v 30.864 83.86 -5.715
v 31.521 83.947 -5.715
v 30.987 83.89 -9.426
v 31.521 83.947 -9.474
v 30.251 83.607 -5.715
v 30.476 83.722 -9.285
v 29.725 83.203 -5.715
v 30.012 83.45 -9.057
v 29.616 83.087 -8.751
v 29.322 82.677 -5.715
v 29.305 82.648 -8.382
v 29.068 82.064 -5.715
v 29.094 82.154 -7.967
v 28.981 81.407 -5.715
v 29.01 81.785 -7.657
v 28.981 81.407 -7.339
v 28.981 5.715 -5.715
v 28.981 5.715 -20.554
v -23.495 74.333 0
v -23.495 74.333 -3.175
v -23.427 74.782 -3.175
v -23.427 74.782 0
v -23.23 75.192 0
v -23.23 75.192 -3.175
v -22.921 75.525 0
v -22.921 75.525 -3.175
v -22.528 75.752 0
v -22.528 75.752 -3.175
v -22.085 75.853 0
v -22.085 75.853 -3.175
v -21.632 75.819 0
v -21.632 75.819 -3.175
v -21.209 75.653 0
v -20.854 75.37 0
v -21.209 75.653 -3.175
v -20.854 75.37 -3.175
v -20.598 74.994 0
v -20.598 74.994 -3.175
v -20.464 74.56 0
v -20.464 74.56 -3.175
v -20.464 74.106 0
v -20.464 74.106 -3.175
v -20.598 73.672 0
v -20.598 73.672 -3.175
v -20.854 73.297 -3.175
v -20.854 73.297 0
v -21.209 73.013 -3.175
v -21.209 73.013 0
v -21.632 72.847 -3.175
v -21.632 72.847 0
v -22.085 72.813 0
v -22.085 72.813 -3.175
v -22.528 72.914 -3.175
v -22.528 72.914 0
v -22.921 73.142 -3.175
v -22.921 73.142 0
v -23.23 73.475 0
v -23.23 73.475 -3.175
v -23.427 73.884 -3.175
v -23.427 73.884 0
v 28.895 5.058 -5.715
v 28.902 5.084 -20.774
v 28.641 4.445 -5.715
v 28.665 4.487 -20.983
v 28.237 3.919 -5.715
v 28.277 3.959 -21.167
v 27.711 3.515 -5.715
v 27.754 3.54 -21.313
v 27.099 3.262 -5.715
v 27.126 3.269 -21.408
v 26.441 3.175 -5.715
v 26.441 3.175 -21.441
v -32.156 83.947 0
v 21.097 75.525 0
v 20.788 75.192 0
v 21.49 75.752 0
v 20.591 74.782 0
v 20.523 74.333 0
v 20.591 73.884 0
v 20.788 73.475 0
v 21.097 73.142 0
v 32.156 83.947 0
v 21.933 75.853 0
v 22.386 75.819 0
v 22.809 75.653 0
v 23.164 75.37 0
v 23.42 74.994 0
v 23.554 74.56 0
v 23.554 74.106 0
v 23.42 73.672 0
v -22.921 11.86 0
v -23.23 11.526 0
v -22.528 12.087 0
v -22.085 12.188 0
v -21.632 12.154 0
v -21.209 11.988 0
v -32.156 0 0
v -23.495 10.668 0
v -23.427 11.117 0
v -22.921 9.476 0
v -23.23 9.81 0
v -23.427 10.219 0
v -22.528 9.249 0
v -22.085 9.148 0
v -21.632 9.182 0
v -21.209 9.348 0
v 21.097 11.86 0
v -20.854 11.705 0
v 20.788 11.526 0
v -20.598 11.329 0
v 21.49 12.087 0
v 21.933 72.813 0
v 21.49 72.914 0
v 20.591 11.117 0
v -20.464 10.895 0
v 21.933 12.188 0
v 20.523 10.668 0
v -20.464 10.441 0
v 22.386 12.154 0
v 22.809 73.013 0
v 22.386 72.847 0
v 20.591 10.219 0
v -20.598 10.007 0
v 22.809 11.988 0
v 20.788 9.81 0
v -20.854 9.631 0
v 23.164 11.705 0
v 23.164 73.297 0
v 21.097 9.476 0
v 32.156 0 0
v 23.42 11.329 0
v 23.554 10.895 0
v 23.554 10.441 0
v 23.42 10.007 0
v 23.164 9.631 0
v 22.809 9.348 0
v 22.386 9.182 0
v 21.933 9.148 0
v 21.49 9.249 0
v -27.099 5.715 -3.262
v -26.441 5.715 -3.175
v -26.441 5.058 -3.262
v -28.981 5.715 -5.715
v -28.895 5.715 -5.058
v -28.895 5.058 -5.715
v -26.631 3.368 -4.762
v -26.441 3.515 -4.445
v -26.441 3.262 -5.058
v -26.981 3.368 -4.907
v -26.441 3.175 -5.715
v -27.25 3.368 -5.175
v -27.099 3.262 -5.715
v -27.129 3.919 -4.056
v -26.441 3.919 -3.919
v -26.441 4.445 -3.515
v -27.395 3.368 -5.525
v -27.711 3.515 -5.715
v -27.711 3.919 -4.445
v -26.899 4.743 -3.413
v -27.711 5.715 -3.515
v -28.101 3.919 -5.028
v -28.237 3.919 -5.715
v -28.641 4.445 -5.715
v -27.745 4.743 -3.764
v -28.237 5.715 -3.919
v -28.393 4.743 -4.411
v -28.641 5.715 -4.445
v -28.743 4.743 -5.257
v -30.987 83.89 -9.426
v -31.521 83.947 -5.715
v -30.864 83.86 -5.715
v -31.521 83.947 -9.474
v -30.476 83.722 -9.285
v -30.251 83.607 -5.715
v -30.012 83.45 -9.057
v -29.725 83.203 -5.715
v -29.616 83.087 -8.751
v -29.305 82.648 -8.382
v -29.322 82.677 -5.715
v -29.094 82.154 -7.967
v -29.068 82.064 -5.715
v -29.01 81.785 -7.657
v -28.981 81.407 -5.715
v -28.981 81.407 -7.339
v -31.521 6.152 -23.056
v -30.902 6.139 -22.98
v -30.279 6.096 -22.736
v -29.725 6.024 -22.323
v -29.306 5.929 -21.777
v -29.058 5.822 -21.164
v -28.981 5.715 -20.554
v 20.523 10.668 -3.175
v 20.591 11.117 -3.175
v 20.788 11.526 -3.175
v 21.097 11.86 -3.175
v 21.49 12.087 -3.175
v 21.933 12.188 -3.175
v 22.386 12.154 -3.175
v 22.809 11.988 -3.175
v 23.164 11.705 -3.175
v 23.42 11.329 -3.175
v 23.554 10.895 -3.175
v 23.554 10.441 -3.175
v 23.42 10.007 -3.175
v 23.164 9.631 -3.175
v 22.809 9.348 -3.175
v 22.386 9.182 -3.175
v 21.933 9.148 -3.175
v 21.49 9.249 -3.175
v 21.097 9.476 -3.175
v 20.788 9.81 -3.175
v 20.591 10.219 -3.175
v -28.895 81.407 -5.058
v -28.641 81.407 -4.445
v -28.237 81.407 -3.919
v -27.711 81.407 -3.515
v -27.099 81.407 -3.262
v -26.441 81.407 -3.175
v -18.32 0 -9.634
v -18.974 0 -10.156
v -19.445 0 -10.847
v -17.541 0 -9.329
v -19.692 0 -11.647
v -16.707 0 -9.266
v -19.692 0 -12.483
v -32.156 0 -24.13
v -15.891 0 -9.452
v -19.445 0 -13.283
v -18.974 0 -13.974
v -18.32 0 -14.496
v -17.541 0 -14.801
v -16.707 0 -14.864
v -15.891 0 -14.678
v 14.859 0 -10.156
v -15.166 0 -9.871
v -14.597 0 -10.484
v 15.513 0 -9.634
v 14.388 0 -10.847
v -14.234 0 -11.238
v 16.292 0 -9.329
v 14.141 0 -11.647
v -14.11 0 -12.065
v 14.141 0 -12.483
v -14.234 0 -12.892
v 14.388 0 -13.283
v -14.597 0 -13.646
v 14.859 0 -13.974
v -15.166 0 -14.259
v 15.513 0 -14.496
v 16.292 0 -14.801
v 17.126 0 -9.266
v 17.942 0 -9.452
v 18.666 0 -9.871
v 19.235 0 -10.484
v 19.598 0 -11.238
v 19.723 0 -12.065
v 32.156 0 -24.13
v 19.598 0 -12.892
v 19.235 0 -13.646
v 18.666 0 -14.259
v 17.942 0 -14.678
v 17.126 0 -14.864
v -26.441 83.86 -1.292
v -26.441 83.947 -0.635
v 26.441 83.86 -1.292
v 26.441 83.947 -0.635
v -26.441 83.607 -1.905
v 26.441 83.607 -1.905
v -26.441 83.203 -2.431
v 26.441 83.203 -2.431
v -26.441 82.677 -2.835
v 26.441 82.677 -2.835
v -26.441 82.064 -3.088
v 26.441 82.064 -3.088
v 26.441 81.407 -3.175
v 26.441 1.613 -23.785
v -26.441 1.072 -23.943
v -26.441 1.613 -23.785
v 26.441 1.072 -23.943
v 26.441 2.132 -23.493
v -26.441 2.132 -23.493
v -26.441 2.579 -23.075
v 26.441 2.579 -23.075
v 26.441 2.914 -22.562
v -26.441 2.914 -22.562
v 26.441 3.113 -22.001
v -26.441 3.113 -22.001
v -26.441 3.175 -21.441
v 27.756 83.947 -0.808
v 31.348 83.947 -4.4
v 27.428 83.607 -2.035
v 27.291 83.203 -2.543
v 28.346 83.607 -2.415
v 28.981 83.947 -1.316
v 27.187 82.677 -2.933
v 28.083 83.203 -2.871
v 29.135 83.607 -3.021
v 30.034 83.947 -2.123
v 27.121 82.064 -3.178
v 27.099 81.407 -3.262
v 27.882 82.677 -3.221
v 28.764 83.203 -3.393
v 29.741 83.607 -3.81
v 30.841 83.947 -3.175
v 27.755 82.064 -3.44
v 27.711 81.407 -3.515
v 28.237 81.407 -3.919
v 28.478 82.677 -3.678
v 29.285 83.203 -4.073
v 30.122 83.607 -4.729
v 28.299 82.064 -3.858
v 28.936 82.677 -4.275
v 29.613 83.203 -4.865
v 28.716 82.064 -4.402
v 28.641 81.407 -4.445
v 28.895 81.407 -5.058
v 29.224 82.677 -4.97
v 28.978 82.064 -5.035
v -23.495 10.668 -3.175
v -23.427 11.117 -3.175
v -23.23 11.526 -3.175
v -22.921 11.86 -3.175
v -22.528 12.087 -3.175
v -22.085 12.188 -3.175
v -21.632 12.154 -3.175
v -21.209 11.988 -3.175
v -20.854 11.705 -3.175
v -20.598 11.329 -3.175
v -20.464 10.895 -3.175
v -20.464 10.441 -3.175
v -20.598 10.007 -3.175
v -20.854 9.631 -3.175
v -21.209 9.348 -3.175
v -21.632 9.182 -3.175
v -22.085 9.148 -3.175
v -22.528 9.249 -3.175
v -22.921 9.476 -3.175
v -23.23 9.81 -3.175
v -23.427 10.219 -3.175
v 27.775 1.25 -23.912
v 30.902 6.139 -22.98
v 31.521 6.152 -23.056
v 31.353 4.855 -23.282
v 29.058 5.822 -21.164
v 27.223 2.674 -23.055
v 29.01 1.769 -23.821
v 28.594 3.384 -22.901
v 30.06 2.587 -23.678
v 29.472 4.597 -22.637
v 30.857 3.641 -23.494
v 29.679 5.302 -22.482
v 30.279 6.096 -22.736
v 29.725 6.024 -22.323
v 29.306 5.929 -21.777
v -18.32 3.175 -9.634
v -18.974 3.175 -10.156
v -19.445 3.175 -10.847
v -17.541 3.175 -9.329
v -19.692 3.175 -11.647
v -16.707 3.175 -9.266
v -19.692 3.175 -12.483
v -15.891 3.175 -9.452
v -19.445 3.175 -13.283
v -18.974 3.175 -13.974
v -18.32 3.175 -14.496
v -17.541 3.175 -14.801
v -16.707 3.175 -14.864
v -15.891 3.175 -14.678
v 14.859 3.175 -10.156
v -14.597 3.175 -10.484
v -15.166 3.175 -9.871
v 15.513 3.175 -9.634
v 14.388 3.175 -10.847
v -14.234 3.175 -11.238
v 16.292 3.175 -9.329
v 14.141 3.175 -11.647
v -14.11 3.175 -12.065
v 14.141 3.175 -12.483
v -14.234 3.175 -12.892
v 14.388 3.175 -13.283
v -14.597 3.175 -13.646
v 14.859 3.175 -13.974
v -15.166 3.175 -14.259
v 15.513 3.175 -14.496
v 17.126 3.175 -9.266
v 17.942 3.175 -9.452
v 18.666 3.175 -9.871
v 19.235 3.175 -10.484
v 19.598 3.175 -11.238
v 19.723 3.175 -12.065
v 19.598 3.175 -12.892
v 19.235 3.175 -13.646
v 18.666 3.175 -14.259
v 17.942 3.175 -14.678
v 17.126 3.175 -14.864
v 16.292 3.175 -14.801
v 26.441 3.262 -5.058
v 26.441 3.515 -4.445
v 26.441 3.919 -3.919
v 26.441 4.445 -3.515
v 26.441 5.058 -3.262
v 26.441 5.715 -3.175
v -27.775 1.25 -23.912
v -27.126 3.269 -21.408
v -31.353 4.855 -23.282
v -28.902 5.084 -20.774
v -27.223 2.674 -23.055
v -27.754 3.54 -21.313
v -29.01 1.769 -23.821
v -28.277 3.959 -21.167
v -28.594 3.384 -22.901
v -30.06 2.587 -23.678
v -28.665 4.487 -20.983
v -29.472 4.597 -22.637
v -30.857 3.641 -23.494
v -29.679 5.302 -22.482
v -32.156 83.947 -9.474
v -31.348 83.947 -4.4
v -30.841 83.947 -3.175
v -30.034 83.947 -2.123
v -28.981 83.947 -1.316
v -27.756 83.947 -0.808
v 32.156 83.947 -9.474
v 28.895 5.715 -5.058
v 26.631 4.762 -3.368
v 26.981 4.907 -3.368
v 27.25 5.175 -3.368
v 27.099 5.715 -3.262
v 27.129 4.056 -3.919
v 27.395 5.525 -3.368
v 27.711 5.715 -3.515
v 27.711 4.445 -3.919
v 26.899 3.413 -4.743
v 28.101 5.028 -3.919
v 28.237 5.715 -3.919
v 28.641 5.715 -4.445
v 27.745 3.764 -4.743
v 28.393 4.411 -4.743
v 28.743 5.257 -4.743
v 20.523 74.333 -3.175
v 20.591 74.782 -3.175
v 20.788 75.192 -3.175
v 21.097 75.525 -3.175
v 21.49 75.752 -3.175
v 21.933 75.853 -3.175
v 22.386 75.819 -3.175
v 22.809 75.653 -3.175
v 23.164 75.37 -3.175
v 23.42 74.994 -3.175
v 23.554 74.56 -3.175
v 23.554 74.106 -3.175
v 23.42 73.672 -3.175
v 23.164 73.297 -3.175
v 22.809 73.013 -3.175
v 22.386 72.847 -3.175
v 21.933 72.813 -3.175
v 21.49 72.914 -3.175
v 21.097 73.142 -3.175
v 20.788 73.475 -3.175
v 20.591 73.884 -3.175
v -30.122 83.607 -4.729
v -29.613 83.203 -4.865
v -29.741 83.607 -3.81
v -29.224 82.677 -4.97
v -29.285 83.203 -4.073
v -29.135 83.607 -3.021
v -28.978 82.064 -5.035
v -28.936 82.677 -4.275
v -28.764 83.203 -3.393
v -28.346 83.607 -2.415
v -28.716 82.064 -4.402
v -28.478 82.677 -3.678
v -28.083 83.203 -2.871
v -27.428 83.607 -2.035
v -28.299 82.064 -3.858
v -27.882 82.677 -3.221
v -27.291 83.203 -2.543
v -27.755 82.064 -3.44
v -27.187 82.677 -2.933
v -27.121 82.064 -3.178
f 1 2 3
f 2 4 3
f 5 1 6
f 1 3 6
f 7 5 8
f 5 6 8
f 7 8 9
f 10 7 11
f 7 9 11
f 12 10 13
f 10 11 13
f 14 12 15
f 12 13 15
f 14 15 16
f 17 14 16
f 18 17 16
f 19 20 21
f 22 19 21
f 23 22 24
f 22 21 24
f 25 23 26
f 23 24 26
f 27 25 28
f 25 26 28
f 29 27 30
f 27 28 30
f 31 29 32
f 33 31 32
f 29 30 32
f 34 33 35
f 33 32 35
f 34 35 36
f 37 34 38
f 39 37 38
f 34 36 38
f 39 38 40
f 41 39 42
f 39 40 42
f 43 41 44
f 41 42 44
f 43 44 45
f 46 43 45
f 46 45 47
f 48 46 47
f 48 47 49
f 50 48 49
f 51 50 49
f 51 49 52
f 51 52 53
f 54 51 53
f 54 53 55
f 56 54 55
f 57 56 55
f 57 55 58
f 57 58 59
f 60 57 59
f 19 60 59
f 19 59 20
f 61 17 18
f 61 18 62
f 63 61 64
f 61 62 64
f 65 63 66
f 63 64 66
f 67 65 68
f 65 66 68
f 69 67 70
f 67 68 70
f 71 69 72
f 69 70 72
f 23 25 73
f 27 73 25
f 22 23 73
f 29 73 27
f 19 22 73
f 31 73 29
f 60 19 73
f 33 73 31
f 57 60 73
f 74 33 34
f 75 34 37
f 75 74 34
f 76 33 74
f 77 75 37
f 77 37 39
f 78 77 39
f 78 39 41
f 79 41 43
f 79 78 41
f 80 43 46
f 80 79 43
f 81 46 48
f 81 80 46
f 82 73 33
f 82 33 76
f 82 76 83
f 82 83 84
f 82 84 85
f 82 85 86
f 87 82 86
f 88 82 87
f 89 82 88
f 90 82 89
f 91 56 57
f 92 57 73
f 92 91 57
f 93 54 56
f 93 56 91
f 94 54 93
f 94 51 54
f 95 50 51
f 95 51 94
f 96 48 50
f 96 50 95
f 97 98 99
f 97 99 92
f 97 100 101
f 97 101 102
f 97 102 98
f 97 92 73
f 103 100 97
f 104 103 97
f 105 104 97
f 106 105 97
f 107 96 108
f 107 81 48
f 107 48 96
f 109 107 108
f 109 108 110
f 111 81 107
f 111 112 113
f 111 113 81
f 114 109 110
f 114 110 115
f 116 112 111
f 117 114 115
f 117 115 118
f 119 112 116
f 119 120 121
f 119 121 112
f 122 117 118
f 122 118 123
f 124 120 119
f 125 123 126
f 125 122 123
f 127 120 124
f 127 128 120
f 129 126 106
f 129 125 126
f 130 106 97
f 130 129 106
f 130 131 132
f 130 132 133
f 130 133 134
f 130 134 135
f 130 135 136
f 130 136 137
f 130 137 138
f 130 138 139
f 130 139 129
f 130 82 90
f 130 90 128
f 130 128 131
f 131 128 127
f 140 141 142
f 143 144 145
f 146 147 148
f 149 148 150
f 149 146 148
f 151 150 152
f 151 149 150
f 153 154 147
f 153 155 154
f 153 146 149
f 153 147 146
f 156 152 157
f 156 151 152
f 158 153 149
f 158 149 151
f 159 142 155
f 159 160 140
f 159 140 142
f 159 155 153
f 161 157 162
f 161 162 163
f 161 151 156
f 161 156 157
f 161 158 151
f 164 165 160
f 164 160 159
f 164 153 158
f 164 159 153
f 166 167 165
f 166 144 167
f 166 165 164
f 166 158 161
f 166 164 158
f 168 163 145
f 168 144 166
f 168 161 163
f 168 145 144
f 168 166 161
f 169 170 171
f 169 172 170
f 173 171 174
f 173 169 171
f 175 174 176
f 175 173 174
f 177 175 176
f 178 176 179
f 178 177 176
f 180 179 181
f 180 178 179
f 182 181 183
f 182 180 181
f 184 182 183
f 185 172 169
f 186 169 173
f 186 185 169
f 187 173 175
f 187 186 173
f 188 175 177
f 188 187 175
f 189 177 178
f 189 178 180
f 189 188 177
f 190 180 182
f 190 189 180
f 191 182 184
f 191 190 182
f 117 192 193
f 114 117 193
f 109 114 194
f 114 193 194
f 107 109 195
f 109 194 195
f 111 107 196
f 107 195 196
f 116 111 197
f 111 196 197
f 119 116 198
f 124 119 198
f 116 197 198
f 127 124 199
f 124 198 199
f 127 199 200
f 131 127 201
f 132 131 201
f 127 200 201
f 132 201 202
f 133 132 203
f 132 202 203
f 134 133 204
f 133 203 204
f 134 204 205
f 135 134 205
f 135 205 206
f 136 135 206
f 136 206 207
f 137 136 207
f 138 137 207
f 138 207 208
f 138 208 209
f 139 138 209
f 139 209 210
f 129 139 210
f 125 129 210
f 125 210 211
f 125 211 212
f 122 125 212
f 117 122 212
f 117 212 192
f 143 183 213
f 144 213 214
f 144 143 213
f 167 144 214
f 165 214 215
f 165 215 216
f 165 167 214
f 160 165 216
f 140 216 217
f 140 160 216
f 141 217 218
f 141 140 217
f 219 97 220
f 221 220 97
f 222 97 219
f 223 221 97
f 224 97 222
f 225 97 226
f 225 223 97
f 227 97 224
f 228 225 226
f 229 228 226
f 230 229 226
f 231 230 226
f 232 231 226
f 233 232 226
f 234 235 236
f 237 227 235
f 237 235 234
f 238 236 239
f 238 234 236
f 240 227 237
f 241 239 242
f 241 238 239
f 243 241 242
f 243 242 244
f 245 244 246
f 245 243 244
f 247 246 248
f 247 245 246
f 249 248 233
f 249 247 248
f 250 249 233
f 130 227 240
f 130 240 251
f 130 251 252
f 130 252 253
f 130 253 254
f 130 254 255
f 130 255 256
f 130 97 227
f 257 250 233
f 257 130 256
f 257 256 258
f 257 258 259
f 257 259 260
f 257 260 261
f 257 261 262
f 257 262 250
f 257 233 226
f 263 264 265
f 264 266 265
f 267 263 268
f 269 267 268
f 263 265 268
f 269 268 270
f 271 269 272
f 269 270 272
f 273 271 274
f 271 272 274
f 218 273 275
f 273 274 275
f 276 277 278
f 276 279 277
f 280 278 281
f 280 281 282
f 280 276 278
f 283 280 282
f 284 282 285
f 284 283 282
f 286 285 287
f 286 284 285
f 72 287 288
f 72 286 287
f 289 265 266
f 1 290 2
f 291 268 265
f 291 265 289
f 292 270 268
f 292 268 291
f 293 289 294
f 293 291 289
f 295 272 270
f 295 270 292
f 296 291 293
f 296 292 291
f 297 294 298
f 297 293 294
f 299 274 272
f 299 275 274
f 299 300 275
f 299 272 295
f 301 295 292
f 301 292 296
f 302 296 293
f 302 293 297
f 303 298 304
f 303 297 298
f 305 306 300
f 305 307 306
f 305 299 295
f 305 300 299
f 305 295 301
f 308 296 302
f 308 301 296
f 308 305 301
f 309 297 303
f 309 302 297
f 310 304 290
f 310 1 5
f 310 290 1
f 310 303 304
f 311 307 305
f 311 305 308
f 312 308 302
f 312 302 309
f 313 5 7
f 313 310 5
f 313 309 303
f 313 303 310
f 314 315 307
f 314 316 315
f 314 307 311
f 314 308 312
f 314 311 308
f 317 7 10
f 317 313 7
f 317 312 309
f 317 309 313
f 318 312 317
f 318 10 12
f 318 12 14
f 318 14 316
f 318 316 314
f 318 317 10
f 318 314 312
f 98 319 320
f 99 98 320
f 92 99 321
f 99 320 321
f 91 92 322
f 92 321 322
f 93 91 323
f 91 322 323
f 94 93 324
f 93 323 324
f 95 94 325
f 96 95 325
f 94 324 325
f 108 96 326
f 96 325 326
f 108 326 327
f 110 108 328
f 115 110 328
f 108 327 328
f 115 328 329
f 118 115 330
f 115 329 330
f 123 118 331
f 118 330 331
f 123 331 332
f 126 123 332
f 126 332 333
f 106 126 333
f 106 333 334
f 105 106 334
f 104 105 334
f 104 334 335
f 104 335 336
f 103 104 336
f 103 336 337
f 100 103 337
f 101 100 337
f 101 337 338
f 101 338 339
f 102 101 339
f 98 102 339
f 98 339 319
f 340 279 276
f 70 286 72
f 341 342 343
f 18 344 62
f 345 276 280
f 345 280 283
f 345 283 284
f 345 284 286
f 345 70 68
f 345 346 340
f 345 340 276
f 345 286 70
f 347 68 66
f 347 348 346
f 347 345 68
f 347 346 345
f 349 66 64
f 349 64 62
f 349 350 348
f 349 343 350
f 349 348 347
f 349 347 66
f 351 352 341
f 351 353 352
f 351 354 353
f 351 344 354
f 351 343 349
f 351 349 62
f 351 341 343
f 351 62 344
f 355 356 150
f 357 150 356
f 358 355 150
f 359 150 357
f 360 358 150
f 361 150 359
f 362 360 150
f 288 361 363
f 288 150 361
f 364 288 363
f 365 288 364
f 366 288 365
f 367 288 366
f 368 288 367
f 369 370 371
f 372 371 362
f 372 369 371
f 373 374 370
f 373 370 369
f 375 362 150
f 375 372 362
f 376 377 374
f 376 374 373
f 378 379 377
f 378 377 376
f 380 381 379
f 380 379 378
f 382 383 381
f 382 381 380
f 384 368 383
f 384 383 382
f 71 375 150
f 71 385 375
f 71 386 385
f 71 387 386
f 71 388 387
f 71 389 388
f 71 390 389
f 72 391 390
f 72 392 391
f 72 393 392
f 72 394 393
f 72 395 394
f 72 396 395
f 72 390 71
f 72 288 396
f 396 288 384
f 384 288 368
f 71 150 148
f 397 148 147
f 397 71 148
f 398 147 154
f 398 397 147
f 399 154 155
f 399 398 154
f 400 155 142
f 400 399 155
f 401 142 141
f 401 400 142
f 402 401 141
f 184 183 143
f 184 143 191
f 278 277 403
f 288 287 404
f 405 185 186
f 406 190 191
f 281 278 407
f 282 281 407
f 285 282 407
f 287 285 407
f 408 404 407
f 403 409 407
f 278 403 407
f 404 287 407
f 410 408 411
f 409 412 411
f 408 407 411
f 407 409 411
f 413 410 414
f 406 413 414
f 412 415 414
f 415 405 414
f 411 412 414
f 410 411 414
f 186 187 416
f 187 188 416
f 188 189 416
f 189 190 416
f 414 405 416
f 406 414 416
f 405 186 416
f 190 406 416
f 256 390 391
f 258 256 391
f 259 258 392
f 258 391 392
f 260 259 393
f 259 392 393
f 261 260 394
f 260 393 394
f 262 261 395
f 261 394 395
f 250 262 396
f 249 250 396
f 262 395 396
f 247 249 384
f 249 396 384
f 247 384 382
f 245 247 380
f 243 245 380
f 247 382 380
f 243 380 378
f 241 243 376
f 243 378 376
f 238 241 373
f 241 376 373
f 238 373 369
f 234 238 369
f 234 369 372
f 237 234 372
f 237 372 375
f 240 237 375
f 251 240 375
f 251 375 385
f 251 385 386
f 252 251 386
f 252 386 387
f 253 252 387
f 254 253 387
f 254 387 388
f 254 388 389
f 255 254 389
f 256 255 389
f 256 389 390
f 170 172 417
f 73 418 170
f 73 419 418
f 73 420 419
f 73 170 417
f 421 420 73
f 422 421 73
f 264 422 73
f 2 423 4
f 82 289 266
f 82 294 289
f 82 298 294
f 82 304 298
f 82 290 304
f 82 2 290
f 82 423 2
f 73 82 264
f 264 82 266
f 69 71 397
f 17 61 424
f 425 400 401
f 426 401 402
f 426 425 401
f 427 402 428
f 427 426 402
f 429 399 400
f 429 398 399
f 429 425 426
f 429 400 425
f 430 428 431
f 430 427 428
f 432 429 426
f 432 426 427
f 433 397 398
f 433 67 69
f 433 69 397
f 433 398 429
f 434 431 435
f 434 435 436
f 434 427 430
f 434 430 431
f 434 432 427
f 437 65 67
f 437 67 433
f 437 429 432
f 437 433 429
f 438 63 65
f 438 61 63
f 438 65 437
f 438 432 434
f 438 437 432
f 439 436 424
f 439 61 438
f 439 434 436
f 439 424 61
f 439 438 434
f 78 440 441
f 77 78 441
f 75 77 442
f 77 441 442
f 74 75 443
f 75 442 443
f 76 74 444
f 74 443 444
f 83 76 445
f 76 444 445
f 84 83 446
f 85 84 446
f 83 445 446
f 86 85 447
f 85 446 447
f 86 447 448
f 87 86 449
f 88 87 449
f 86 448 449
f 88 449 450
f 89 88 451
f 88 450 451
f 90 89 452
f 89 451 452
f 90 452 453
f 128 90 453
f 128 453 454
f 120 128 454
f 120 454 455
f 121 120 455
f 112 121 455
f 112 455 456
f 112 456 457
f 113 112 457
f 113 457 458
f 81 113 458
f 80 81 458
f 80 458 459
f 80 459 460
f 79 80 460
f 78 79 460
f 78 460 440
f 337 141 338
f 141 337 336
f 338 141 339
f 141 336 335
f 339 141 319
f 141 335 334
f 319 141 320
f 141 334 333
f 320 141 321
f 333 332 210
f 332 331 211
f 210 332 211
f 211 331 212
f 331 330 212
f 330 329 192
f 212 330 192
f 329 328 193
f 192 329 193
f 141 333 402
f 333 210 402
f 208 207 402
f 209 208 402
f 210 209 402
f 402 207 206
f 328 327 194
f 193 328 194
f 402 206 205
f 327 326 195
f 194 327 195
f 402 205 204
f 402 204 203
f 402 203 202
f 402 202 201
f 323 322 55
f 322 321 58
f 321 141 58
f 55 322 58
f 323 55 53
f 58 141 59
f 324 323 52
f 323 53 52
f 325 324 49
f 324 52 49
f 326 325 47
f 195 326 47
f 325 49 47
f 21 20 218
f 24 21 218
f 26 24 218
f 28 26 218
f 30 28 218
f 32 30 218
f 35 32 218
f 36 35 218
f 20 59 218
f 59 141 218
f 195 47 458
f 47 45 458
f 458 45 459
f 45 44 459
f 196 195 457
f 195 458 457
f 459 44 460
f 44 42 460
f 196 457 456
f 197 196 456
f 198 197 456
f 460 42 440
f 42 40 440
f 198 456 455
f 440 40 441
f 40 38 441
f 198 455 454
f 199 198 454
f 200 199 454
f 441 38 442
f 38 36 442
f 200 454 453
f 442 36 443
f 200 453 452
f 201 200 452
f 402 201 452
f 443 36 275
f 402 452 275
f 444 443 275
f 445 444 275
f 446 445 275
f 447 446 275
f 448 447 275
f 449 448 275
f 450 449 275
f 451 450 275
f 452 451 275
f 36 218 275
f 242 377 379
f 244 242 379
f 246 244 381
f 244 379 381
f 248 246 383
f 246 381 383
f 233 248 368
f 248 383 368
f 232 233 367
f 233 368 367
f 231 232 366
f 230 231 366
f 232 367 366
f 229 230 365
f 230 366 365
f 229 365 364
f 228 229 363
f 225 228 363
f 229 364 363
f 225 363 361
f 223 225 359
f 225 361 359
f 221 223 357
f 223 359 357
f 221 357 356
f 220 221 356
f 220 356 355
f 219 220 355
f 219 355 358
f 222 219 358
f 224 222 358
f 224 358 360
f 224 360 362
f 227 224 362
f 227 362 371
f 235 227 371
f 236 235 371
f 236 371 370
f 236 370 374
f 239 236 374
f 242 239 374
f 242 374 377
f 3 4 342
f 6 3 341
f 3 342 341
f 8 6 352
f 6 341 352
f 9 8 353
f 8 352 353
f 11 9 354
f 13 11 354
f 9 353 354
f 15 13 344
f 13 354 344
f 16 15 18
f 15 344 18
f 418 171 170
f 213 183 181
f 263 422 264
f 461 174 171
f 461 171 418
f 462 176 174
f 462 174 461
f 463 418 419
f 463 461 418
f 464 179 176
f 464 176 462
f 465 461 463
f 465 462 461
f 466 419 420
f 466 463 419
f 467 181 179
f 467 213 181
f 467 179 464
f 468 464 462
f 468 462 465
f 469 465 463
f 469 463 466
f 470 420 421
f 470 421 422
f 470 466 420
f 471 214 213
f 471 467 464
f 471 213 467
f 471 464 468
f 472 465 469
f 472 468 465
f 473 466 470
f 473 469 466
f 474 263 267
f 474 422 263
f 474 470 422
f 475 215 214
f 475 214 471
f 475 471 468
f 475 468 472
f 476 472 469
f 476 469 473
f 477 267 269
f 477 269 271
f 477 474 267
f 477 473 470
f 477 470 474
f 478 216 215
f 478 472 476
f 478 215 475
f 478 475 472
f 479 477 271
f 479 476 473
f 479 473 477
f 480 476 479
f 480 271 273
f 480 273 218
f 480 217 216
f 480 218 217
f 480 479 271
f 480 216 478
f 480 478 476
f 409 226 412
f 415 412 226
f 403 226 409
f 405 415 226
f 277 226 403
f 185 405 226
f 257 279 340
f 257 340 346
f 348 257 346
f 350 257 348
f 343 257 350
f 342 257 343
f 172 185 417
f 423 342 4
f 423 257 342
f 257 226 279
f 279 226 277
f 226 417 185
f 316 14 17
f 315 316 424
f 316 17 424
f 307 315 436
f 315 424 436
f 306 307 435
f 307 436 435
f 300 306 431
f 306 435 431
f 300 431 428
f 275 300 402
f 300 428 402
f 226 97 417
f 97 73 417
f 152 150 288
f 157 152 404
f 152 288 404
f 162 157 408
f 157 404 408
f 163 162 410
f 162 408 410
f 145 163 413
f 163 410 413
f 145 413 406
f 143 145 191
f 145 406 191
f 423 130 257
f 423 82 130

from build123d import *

# Parameters (mm, degrees)
BOSS_EXTRUDE1_DEPTH        = 32.1564
SKETCH2_W                  = 57.9628
SKETCH2_H                  = 20.955
CUT_EXTRUDE1_DEPTH         = 80.772
F_31_0_12_DIAMETER_HOLE1_D = 3.048
F_2_0_221_DIAMETER_HOLE1_D = 5.6134
FILLET1_R                  = 2.54


with BuildPart() as part:
    # Sketch1 → Boss-Extrude1 (new body, symmetric)
    with BuildSketch(Plane(origin=(0, 0, 0), x_dir=(0, 0, -1), z_dir=(1, 0, 0))):
        Polygon((0, 0), (24.13, 0), (9.4742, 83.947), (0, 83.947), align=None)
    extrude(amount=BOSS_EXTRUDE1_DEPTH, both=True)

    # Sketch2 → Cut-Extrude1 (cut)
    with BuildSketch(Plane(origin=(0, 83.947, 0), x_dir=(1, 0, 0), z_dir=(0, 1, 0))):
        with Locations((0, 13.6525)):
            Rectangle(SKETCH2_W, SKETCH2_H)
    extrude(amount=-CUT_EXTRUDE1_DEPTH, mode=Mode.SUBTRACT)

    # #31 (0.12) Diameter Hole1 (through all)
    with Locations(Plane.XY):
        with Locations((-21.971, 74.3331), (22.0472, 74.3331), (22.0472, 10.668), (-21.971, 10.668)):
            Hole(F_31_0_12_DIAMETER_HOLE1_D / 2)

    # #2 (0.221) Diameter Hole1 (through all)
    with Locations(Plane(origin=(0, 0, 0), x_dir=(-1, 0, 0), z_dir=(0, -1, 0))):
        with Locations((-16.9164, 12.065), (16.9164, 12.065)):
            Hole(F_2_0_221_DIAMETER_HOLE1_D / 2)

    # Fillet1
    fillet1_edges = [part.edges().sort_by_distance(p)[0] for p in [
        (0, 3.175, -23.575695915),
        (28.9814, 43.561, -16.524947958),
        (-28.9814, 43.561, -16.524947958),
        (-28.9814, 43.561, -3.175),
        (-28.9814, 83.947, -6.3246),
        (0, 83.947, -3.175),
        (28.9814, 83.947, -6.3246),
        (28.9814, 3.175, -13.375347958),
        (0, 3.175, -3.175),
        (-28.9814, 3.175, -13.375347958),
        (28.9814, 43.561, -3.175),
    ]]
    fillet(fillet1_edges, radius=FILLET1_R)


solid = part.part
